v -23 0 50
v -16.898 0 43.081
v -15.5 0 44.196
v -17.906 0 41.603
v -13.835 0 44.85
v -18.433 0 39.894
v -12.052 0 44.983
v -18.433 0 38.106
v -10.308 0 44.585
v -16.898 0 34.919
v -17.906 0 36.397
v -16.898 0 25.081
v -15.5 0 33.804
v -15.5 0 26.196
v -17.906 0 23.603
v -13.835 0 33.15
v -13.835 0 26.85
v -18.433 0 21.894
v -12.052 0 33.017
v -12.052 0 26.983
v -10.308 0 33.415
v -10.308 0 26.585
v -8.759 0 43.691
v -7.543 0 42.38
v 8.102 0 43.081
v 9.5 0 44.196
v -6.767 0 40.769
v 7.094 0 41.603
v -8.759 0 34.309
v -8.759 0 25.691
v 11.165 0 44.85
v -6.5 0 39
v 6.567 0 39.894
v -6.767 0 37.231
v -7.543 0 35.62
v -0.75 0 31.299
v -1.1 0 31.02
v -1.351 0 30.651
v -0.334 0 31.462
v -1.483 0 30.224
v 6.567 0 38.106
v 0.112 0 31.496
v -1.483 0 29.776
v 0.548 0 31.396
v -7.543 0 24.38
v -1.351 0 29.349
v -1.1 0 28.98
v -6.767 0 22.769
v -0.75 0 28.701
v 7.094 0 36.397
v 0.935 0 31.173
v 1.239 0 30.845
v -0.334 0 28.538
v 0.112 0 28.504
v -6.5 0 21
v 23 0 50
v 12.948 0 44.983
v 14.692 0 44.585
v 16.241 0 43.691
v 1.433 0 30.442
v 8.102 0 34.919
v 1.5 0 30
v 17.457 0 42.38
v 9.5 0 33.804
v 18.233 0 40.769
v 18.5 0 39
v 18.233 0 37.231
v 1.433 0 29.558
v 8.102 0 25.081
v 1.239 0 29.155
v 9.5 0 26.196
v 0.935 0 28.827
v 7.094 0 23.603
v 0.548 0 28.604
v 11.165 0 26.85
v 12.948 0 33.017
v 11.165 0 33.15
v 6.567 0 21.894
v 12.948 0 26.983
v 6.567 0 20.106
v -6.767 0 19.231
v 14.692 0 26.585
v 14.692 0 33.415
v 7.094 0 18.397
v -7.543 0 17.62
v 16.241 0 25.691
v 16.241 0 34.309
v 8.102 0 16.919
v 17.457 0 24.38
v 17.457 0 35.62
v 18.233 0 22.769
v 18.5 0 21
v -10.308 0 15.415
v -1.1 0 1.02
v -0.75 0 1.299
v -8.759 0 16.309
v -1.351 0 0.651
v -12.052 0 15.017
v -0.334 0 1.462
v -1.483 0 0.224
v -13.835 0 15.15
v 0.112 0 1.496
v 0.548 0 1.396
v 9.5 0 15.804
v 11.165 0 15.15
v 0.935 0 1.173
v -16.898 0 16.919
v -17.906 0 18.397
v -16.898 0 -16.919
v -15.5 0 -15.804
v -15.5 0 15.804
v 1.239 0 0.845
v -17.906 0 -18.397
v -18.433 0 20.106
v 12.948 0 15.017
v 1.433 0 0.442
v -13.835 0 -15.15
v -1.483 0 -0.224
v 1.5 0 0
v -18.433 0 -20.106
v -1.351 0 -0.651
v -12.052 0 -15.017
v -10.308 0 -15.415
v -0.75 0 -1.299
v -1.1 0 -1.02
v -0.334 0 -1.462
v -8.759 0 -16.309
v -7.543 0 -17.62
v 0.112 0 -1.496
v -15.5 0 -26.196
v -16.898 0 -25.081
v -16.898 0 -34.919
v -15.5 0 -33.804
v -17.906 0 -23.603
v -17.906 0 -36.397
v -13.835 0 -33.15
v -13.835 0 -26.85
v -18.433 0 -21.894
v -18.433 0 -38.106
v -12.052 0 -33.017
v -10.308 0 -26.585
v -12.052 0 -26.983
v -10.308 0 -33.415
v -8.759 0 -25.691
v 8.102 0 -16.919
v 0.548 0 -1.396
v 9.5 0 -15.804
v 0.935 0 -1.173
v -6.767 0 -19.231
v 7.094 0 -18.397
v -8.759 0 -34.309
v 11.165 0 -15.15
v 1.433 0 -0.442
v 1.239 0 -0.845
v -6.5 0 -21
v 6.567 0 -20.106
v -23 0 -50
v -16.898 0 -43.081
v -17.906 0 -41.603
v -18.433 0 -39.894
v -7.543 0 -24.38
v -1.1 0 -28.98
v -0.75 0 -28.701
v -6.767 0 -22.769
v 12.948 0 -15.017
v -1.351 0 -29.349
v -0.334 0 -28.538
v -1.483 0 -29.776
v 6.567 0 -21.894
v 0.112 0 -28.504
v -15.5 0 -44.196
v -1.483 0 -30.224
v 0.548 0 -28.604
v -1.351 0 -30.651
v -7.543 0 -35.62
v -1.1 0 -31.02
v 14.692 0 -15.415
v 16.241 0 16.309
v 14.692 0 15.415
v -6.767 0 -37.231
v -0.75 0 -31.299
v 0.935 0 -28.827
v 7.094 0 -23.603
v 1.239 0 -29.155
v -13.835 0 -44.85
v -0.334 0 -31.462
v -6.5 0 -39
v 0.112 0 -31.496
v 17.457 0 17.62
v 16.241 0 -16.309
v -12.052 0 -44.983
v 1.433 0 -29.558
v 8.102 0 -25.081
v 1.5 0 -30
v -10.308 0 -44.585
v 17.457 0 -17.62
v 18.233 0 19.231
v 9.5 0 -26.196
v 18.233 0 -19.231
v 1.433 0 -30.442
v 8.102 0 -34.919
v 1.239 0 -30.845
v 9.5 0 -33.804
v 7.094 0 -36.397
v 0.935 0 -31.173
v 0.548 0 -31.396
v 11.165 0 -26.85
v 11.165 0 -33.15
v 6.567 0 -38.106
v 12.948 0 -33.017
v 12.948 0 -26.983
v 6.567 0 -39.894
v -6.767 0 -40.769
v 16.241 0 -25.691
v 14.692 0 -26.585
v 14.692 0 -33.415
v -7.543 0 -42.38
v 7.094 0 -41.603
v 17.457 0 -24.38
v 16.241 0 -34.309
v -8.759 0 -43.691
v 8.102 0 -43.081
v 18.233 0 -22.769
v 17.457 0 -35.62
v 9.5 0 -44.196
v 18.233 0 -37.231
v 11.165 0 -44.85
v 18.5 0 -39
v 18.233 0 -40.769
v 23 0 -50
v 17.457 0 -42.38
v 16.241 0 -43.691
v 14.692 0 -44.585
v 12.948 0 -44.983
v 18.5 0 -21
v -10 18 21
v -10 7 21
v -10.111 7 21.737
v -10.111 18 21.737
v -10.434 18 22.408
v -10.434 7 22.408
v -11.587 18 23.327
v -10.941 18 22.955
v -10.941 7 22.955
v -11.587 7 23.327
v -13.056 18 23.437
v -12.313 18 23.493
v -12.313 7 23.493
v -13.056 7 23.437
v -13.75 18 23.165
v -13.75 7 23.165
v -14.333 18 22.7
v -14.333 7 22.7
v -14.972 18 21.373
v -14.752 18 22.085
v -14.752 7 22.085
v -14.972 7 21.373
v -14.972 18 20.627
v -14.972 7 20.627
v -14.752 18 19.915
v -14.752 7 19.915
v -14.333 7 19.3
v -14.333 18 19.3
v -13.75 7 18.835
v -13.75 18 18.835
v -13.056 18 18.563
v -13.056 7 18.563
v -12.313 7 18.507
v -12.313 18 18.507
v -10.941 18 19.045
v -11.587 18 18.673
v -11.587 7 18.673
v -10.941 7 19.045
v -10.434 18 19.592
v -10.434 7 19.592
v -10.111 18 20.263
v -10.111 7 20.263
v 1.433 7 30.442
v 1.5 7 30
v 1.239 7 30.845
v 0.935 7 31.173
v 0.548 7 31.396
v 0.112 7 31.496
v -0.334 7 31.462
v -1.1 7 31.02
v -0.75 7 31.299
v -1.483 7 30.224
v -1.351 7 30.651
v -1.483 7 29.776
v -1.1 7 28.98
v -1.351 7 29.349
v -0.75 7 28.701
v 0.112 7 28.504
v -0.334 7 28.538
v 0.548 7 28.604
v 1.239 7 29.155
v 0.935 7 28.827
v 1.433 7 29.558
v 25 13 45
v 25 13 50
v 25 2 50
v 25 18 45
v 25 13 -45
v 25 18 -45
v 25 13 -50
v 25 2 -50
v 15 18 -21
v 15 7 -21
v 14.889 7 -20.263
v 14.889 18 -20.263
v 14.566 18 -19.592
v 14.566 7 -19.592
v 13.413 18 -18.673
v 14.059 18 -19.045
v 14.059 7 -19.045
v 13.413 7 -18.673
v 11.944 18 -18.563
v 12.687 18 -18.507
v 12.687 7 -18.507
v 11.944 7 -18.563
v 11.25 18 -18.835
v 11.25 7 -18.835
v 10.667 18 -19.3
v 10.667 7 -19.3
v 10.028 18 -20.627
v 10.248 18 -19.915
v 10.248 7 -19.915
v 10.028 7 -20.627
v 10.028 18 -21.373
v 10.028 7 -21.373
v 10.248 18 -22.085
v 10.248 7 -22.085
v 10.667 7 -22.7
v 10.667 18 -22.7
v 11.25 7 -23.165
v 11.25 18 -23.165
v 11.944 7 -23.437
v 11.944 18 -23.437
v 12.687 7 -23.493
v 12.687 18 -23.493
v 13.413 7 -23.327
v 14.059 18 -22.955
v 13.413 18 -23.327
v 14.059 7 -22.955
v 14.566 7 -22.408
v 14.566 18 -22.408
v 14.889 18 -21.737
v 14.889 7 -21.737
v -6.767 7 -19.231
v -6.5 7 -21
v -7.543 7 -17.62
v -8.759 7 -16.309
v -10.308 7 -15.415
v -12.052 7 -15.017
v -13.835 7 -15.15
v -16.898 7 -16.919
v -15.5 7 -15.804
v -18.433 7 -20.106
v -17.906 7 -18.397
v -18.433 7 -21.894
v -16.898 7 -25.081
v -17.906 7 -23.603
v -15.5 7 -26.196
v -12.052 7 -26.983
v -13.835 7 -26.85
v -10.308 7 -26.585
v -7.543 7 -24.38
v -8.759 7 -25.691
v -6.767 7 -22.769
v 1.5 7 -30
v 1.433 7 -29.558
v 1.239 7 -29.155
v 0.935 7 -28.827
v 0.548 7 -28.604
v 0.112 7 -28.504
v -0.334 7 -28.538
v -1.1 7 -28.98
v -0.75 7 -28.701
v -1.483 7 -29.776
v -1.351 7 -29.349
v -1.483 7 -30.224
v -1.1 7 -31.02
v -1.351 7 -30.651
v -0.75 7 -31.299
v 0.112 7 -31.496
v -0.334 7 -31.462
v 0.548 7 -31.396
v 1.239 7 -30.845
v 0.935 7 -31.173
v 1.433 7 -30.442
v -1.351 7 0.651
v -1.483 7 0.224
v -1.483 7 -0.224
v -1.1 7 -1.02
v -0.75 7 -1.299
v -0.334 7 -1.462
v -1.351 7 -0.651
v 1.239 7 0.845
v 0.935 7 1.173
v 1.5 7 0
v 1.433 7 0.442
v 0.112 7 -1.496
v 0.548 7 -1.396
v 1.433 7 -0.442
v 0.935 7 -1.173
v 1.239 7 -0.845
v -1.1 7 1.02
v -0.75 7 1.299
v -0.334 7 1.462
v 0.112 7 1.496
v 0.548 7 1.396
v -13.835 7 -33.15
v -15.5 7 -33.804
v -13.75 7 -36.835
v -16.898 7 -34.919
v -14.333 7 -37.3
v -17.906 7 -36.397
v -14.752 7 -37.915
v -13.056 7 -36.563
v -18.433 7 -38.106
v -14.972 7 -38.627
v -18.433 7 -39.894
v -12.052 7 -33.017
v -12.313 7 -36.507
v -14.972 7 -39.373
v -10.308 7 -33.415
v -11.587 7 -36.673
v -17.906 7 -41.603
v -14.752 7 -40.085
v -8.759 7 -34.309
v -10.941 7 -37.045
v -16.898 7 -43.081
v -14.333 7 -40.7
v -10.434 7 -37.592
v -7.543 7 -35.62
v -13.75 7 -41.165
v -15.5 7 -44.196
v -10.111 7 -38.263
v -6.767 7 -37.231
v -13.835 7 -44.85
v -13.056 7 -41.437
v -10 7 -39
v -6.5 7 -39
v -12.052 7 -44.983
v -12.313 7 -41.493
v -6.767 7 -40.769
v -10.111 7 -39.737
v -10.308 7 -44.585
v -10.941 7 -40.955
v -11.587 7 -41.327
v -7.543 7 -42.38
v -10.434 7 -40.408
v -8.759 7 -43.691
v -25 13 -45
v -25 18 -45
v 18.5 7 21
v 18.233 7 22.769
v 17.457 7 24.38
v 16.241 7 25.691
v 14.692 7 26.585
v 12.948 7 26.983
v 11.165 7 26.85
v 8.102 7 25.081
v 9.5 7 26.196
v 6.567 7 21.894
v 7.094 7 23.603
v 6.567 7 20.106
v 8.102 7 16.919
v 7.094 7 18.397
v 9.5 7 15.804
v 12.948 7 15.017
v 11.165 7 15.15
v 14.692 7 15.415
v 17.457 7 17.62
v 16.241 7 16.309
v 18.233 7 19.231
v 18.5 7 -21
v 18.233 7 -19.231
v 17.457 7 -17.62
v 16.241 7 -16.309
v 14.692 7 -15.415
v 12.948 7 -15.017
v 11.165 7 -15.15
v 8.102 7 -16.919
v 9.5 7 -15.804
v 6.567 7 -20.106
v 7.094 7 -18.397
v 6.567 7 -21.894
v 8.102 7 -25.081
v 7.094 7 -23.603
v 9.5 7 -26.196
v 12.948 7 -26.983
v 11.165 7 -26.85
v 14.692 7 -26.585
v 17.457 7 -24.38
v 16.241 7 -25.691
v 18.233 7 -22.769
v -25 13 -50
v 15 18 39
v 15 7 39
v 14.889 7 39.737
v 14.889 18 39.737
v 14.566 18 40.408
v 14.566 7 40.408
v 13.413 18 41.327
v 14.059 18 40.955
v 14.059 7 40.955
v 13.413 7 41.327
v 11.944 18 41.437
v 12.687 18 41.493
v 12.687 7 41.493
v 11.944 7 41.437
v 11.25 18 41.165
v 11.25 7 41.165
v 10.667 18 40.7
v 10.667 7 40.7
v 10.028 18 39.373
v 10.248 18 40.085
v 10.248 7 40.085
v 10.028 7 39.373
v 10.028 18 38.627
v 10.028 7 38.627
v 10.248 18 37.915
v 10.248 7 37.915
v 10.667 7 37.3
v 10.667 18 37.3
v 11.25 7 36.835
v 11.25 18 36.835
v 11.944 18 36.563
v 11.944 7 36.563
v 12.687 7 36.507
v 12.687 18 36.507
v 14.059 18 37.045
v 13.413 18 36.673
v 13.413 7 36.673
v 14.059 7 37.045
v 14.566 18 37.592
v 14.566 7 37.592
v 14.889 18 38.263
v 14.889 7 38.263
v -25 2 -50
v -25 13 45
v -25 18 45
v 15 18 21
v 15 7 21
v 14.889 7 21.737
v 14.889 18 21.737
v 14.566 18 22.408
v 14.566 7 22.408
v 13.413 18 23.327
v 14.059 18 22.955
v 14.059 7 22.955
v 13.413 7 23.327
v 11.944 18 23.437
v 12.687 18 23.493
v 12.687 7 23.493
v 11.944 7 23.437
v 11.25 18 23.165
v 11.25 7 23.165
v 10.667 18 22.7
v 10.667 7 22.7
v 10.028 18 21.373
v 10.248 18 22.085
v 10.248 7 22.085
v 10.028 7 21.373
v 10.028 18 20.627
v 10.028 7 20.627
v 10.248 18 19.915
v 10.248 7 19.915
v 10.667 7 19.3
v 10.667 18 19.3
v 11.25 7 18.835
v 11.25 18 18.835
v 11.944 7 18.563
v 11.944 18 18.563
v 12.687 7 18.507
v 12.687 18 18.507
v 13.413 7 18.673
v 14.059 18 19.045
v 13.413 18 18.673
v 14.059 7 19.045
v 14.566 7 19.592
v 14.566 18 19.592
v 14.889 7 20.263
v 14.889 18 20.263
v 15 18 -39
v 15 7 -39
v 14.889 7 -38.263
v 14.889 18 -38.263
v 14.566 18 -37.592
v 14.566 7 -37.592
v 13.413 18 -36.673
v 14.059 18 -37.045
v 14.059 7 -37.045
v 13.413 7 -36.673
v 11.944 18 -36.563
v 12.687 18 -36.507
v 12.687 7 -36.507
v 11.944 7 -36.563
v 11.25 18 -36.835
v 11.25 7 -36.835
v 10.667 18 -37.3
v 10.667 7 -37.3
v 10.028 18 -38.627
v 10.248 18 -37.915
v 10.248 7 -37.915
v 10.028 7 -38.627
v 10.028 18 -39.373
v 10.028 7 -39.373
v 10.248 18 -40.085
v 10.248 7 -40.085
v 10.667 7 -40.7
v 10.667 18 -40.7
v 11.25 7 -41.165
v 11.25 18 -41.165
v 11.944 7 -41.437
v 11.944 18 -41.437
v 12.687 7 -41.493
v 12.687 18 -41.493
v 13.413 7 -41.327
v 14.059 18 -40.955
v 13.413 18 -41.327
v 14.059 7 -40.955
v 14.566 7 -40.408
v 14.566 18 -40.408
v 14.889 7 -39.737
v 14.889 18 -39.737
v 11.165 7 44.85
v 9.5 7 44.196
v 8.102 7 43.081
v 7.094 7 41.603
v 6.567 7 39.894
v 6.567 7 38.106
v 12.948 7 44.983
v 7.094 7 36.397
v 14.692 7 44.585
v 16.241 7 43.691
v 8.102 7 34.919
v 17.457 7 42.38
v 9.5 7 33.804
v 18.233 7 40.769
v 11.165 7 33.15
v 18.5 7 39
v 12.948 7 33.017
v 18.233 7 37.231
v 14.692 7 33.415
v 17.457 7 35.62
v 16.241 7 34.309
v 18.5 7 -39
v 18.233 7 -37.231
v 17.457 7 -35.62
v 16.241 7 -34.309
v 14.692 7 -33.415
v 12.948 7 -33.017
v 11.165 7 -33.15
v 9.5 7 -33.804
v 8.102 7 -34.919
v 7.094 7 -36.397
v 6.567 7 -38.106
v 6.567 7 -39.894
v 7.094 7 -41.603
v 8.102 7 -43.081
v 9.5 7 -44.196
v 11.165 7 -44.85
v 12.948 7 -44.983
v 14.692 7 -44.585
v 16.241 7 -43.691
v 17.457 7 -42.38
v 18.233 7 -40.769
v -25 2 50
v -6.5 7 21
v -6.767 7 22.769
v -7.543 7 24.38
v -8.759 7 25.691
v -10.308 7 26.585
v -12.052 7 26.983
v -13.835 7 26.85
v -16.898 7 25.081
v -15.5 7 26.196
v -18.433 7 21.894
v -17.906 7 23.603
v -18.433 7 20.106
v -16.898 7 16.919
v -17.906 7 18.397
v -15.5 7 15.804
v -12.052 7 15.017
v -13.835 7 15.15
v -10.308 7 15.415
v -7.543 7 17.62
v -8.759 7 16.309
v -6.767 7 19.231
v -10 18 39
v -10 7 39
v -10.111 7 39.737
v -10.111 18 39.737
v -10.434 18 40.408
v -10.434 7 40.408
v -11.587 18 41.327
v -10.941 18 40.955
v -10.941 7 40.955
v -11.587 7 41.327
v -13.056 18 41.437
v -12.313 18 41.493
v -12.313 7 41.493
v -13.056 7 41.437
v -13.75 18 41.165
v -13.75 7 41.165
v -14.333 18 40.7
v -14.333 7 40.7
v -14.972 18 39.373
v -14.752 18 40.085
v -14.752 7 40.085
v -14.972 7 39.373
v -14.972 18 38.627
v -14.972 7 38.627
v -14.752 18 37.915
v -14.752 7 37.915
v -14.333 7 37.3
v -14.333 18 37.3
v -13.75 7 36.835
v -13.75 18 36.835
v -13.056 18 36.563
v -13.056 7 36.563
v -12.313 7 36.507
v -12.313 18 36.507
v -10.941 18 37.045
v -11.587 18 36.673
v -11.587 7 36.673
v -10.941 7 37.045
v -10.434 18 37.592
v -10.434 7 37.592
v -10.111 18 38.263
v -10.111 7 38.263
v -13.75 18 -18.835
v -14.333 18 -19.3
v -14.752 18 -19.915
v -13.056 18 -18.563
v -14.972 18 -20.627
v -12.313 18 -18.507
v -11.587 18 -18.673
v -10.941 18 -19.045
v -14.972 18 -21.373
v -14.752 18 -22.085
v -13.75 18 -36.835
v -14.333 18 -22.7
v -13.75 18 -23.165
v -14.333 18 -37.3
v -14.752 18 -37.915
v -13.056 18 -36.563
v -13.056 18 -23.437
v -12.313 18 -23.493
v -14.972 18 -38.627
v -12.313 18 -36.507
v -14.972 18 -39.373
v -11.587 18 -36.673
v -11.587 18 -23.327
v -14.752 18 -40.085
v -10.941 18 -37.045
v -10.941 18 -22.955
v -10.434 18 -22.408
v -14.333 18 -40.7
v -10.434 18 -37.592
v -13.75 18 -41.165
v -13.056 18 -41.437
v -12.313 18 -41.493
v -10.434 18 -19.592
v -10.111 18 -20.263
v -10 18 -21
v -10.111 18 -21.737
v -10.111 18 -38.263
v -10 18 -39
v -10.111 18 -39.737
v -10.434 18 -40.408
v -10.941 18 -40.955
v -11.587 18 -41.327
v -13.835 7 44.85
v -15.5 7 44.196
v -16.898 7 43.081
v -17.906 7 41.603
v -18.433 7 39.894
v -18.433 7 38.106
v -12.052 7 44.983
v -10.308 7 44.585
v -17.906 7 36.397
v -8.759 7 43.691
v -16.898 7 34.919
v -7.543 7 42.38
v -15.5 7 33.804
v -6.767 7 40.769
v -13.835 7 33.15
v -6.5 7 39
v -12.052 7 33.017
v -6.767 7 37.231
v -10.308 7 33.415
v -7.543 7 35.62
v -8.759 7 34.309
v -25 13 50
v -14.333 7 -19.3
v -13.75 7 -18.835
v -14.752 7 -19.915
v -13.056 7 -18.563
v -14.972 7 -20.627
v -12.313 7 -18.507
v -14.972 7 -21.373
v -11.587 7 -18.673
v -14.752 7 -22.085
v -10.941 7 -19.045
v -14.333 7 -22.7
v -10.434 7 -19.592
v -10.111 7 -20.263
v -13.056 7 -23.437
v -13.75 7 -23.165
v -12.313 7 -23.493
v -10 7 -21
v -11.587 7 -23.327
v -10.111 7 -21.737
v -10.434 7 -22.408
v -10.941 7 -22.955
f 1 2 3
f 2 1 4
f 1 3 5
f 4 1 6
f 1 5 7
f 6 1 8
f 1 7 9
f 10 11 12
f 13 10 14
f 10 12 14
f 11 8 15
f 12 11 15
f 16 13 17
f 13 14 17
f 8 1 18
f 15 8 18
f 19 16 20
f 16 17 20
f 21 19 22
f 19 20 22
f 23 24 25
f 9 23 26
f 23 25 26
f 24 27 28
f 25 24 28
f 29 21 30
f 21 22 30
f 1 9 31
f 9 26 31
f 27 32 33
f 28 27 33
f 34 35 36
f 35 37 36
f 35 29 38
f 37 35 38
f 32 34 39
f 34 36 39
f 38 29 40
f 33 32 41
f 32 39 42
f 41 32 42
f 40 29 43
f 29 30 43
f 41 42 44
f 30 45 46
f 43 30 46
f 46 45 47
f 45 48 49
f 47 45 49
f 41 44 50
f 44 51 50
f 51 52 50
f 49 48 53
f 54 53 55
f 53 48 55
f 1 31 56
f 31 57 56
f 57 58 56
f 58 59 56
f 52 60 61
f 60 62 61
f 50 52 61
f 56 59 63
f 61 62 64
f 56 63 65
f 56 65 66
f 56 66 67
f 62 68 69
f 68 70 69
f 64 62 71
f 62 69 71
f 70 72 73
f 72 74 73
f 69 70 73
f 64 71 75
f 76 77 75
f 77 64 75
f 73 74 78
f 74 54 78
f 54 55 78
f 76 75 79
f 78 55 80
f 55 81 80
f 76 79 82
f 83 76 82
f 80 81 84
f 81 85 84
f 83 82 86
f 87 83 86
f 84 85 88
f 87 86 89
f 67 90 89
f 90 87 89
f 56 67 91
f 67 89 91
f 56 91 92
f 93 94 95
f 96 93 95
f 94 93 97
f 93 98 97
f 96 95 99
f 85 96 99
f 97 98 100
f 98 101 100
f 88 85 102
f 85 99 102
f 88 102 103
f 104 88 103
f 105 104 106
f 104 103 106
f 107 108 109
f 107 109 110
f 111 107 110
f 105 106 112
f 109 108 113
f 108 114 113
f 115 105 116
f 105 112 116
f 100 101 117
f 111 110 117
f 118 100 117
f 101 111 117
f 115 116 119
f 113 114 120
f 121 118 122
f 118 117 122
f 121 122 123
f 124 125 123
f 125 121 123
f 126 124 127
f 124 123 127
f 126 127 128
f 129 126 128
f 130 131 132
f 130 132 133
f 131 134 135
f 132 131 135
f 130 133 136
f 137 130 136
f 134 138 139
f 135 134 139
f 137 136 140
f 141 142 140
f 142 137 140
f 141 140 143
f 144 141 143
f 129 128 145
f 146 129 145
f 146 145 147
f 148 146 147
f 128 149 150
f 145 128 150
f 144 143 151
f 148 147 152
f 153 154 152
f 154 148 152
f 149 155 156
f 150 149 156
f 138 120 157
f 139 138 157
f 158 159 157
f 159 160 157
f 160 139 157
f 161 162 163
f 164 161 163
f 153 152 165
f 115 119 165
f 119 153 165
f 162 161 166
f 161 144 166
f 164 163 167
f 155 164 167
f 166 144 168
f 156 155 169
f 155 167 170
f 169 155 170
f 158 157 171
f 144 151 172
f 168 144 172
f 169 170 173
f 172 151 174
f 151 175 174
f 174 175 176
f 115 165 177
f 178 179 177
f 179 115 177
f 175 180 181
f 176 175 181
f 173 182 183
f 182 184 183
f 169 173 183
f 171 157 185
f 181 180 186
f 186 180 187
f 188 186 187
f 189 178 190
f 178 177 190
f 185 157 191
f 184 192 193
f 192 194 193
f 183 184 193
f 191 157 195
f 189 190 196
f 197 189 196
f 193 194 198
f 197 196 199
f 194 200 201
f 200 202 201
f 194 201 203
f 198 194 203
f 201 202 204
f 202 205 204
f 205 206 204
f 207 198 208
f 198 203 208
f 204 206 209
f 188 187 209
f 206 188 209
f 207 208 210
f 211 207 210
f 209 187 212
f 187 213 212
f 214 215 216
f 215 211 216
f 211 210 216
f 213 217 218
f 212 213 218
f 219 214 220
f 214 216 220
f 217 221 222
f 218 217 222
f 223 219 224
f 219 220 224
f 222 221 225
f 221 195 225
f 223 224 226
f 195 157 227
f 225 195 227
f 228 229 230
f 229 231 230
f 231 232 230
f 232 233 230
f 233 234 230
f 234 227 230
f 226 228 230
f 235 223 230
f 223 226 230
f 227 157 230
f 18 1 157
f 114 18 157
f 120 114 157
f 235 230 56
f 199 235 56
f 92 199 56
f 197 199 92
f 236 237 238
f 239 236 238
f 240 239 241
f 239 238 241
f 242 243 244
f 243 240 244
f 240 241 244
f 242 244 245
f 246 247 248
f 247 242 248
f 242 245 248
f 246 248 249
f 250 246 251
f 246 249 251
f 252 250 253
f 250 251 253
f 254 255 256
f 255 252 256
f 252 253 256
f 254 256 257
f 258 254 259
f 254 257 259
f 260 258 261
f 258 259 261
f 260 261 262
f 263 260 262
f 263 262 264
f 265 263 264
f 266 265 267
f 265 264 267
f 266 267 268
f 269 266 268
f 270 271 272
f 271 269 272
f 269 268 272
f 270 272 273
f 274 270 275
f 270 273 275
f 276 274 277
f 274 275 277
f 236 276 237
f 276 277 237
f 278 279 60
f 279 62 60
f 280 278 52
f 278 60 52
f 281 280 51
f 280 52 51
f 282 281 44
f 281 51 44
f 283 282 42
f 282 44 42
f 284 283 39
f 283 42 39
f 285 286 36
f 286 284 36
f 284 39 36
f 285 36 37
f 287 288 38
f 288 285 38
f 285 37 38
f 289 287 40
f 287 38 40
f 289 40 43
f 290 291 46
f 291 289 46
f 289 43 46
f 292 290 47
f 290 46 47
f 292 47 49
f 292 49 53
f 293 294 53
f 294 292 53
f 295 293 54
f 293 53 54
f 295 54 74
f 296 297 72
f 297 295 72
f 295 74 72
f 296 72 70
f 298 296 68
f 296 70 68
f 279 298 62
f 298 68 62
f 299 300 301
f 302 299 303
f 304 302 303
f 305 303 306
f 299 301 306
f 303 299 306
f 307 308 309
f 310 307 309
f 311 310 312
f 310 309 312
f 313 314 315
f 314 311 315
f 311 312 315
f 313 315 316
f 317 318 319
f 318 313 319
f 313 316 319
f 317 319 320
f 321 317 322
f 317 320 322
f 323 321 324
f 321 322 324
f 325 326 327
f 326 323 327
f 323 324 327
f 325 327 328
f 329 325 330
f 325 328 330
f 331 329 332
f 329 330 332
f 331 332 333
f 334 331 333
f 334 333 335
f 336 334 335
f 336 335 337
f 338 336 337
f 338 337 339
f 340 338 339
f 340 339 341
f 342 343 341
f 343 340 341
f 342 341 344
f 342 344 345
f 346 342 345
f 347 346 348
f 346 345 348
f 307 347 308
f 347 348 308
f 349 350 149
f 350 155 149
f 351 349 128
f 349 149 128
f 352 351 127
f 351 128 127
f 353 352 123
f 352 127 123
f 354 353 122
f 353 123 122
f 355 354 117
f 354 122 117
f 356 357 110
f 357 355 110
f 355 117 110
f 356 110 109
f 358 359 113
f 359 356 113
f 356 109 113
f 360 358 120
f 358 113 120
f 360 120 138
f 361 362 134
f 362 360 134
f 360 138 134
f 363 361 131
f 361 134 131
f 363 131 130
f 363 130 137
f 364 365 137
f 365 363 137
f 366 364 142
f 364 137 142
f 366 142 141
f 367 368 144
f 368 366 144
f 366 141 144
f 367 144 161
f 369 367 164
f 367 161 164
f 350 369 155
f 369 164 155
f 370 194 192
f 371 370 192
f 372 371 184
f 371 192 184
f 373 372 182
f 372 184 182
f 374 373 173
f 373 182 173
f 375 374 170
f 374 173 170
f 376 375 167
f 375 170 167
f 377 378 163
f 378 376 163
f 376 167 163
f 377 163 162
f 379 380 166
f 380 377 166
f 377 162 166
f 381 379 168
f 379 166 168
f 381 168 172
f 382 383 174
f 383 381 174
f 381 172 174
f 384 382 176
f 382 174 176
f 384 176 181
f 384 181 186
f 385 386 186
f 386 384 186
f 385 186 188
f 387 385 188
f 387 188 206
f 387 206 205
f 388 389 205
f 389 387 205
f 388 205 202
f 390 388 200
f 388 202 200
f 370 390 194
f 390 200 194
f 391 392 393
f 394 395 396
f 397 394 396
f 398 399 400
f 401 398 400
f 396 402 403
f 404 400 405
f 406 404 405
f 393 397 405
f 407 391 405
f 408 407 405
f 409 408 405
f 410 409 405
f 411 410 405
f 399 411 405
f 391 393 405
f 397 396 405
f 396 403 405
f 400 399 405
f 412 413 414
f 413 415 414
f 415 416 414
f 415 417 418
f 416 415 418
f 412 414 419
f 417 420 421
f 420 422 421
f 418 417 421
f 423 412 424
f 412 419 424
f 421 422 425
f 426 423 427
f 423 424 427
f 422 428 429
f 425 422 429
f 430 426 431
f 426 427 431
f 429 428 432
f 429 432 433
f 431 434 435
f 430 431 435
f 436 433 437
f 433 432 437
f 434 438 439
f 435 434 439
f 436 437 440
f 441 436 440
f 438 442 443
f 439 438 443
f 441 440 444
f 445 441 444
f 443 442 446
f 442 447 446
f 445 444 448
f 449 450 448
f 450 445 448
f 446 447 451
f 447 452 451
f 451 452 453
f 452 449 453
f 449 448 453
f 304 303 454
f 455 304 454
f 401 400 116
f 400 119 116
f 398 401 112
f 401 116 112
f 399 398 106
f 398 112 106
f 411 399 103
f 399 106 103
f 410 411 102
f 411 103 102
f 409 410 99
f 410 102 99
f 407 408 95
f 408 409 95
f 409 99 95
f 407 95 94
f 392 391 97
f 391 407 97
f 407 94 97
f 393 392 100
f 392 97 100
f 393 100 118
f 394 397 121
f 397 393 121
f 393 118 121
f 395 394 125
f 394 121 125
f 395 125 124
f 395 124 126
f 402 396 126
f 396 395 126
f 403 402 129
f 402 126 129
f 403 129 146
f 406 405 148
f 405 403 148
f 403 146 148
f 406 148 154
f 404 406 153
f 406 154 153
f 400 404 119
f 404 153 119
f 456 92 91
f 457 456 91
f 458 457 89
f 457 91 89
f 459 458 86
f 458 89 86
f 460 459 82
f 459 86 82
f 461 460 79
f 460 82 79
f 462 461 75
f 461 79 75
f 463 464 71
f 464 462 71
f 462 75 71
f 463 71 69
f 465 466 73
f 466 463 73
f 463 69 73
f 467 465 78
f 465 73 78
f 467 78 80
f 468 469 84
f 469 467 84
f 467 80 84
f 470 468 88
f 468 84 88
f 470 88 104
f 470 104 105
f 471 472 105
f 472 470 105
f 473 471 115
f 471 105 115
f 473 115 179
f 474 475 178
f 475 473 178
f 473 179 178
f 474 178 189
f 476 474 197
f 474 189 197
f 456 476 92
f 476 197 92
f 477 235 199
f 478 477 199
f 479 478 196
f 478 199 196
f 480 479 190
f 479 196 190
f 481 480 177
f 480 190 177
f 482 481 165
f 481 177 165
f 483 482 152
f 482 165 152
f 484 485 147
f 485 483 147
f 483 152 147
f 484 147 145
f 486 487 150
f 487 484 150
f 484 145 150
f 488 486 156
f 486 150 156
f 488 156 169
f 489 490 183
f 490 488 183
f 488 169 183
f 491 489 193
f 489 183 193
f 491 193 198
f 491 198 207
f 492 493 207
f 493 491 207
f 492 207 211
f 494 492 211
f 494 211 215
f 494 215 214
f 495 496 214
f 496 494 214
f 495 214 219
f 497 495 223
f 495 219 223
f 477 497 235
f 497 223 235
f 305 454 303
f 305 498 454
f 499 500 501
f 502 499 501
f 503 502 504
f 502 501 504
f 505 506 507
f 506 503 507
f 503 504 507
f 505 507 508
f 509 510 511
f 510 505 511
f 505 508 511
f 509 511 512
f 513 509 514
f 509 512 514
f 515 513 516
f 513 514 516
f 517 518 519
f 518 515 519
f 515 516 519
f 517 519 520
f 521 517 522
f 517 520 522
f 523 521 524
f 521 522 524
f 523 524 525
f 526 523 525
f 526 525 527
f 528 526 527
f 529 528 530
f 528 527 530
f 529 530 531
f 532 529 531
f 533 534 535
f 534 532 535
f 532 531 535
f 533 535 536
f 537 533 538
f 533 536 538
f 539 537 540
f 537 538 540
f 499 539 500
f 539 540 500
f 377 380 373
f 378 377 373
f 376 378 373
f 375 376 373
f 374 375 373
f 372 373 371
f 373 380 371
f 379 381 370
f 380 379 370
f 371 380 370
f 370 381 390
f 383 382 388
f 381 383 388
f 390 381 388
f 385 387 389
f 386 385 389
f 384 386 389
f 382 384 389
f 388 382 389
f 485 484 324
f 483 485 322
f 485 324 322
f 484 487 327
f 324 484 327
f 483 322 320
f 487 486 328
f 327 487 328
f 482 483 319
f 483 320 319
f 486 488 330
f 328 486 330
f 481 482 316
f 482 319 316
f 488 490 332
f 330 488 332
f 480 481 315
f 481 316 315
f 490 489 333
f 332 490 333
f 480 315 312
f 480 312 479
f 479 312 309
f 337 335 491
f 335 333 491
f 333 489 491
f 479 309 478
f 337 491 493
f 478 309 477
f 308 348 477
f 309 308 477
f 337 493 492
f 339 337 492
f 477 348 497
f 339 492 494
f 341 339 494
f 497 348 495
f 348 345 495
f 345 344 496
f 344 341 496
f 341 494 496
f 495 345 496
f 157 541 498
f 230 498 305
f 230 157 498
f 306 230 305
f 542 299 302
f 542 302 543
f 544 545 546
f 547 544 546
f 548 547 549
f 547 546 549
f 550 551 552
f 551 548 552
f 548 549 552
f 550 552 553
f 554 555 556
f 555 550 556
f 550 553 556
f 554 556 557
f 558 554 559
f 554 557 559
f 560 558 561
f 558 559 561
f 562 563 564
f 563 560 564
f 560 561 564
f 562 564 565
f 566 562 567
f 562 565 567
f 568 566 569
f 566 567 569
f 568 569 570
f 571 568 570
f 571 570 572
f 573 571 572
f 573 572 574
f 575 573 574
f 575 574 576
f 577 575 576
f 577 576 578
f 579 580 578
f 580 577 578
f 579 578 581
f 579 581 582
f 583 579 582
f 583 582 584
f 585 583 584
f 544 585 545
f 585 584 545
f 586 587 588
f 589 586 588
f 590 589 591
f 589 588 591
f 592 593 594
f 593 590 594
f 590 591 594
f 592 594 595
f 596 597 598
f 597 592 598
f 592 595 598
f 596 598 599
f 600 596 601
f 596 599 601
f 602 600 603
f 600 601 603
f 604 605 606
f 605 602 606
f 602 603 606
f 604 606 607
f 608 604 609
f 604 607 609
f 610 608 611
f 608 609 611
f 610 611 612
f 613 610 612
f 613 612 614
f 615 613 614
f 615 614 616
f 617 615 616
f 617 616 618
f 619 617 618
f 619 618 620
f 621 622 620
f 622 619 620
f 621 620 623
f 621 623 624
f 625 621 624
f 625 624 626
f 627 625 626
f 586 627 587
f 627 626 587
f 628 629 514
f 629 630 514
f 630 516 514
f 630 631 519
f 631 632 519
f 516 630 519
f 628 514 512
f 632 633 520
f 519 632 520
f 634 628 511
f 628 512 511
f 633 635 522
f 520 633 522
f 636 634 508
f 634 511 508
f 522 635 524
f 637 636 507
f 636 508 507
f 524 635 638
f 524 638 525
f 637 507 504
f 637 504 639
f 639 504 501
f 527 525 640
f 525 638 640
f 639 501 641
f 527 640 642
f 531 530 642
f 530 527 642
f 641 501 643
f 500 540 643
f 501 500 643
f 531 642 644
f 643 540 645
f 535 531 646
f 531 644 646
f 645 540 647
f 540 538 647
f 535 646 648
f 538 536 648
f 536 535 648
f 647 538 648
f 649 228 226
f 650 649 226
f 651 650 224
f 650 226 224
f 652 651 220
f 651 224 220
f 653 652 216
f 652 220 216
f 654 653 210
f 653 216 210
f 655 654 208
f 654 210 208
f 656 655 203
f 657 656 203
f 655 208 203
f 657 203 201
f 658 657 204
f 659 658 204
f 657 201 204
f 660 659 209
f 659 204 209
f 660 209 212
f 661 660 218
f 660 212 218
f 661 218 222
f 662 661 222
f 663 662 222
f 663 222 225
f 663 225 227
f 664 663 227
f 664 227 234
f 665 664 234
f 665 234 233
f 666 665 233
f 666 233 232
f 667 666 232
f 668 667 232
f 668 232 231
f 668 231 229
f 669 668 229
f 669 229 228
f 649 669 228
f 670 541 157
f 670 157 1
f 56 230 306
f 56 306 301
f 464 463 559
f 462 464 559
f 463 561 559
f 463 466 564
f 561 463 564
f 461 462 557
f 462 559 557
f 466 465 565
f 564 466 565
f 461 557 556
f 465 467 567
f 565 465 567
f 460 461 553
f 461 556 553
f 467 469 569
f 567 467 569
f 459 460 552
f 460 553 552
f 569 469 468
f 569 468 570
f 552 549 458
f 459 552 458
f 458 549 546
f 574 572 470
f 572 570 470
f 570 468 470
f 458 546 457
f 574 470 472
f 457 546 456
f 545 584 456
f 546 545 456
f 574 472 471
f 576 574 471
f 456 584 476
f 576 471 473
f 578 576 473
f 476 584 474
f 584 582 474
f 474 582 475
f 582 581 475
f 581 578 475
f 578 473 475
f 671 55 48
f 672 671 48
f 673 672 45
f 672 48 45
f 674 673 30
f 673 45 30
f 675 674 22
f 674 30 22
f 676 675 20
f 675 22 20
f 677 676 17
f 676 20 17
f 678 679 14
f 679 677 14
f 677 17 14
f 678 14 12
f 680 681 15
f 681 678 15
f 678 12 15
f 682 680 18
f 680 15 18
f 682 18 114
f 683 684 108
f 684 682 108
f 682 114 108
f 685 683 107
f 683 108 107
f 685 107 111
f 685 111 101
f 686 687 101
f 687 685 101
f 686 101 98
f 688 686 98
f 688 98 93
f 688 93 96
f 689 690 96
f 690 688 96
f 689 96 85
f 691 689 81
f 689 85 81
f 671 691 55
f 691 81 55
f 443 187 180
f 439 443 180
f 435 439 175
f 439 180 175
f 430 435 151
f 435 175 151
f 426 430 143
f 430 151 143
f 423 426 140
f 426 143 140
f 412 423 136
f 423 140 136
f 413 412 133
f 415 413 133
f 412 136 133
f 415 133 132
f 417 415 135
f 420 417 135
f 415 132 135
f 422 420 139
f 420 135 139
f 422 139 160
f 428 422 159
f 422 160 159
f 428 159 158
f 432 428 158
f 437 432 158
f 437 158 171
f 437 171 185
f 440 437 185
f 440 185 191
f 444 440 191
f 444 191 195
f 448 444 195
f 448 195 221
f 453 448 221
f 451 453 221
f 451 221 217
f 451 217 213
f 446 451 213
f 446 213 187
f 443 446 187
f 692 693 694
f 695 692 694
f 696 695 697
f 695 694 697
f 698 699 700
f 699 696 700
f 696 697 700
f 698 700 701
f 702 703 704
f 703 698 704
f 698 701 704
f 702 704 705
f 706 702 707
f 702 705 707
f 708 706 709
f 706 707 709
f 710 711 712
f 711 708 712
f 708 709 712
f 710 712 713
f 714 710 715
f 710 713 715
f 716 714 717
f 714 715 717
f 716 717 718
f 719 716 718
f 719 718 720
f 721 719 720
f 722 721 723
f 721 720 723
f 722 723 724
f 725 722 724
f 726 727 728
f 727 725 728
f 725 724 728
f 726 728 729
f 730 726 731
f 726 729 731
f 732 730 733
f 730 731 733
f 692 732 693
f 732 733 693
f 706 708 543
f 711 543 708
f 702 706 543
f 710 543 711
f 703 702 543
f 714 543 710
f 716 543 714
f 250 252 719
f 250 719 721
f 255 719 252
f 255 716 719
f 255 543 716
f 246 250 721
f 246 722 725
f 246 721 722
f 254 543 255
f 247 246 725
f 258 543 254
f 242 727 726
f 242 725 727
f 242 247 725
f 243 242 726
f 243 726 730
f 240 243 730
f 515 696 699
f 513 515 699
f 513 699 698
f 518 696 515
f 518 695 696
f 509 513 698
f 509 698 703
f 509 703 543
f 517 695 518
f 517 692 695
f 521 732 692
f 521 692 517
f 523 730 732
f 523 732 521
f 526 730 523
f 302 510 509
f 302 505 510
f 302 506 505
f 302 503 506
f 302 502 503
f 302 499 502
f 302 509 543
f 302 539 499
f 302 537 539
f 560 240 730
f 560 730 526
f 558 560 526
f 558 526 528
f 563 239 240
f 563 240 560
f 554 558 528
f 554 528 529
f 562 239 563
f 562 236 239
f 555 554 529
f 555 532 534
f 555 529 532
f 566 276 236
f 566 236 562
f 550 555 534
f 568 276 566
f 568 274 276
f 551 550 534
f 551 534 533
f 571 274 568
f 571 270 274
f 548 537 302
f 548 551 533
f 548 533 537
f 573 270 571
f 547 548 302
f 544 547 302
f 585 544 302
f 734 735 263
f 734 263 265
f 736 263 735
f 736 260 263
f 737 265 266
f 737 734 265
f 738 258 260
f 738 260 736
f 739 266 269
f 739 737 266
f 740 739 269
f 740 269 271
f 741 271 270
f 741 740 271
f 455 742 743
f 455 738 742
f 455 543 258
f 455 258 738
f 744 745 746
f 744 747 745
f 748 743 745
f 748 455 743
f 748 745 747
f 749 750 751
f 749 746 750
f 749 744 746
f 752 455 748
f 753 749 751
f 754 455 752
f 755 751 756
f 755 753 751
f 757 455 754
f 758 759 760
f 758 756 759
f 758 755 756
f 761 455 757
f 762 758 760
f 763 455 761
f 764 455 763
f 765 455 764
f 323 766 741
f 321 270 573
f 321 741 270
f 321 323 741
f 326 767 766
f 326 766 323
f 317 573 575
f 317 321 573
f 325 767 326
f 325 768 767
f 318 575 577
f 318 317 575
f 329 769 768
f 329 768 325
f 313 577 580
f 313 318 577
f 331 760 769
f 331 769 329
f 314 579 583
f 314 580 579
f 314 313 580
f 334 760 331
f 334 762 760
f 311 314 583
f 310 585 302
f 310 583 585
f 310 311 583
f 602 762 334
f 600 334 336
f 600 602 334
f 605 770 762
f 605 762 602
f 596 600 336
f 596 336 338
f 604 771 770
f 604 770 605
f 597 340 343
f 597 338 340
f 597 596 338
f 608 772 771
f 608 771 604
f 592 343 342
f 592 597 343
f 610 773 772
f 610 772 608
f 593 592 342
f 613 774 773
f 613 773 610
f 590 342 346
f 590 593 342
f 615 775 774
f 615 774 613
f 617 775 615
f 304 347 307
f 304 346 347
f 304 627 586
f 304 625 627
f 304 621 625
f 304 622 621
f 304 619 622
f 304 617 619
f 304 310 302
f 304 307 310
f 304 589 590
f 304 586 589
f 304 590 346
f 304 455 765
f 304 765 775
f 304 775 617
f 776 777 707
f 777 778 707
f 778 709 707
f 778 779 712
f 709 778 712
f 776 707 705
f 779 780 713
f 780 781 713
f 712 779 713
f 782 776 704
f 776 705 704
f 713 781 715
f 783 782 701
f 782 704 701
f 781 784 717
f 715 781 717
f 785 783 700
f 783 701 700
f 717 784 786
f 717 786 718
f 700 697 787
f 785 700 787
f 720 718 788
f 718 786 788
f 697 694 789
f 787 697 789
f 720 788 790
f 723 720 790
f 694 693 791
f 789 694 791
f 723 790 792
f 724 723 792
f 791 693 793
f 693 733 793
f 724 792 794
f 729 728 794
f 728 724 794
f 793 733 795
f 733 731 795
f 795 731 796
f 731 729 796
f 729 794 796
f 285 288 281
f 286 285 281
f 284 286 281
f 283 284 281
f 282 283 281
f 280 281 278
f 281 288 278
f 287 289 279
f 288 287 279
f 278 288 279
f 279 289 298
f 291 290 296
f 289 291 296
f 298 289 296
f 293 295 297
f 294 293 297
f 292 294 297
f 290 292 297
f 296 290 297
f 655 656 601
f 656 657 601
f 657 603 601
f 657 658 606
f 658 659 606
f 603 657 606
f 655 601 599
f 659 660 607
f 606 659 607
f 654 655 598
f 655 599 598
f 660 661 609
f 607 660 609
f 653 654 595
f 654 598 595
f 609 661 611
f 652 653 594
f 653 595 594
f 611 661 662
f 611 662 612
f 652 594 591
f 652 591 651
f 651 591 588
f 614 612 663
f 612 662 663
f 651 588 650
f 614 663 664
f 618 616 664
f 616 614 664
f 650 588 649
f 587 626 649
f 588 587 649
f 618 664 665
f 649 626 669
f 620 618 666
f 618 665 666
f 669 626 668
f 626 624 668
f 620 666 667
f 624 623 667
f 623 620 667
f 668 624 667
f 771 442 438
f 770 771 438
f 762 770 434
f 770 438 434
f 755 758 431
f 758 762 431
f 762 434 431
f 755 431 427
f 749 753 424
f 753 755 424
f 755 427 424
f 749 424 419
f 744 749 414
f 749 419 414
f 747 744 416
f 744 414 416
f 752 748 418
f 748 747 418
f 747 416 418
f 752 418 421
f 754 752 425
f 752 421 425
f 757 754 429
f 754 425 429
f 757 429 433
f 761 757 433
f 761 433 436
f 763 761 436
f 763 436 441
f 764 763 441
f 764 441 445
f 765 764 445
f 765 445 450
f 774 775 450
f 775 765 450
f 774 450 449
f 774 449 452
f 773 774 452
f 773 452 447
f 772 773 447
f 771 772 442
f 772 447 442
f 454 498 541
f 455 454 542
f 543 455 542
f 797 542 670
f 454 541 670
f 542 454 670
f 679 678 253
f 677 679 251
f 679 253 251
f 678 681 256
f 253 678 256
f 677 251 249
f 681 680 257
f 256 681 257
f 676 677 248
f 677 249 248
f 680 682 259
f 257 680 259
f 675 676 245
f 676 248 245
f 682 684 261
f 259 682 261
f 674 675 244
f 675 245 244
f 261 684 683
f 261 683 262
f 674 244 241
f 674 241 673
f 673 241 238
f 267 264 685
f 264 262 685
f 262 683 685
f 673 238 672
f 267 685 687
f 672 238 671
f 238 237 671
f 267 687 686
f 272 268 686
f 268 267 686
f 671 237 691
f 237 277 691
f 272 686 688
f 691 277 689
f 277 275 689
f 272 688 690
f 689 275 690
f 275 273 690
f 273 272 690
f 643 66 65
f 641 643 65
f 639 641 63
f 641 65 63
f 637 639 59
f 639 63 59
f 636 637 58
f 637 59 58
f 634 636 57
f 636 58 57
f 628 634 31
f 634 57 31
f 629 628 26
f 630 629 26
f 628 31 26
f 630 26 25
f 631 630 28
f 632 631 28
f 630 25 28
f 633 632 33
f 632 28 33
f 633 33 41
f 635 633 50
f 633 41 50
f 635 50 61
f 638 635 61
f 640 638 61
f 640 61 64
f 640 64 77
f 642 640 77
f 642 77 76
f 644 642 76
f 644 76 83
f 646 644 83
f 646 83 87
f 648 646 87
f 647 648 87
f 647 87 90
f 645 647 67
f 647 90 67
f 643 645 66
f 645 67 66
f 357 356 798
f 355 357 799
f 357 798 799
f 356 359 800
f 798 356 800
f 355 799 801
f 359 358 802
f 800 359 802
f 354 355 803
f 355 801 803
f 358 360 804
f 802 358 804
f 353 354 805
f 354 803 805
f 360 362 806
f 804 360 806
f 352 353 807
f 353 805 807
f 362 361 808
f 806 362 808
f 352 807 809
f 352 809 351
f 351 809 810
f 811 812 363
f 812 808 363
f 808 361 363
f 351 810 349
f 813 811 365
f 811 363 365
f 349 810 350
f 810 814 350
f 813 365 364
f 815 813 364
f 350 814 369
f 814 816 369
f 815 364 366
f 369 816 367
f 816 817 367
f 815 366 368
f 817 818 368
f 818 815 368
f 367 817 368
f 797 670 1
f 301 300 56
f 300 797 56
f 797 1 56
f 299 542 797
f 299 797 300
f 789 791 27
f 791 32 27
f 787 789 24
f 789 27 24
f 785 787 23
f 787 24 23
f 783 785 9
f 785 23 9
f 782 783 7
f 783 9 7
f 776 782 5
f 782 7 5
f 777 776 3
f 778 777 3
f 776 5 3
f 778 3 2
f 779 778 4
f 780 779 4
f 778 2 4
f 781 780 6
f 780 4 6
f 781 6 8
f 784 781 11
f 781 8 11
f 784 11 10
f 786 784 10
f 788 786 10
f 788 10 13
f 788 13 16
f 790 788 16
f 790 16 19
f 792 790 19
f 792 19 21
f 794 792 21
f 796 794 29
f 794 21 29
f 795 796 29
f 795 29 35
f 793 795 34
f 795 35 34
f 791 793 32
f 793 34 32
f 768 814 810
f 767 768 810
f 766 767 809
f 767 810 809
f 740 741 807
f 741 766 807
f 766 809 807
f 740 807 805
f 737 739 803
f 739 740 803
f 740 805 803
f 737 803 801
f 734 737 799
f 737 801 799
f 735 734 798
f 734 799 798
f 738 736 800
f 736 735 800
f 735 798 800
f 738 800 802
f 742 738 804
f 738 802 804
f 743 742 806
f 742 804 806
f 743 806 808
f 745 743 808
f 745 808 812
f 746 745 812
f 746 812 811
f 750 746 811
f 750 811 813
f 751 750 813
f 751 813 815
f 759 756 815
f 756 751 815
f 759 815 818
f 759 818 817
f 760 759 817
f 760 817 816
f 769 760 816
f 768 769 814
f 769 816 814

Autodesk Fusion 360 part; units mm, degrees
sketch "Board" plane through (0, 0, 0) normal (0, 1, 0) x (1, 0, 0)
  line L0 (-25, -45) -> (-25, -50)
  circle A0 centre (12.5, -39) radius 6
  line L1 (-25, -50) -> (25, -50)
  circle A1 centre (12.5, -21) radius 2.5
  circle A2 centre (12.5, 21) radius 2.5
  line L2 (-25, 50) -> (25, 50)
  circle A3 centre (0, 30) radius 1.5
  line L3 (-25, 45) -> (-25, 50)
  circle A4 centre (12.5, 39) radius 6
  circle A5 centre (-12.5, 21) radius 2.5
  circle A6 centre (12.5, 21) radius 6
  line L4 (25, 50) -> (25, 45)
  circle A7 centre (12.5, -21) radius 6
  line L5 (-25, 50) -> (25, 50)
  circle A8 centre (-12.5, 21) radius 6
  circle A9 centre (-12.5, -21) radius 2.5
  line L6 (25, 50) -> (-25, 50)
  circle A10 centre (12.5, 39) radius 2.5
  circle A11 centre (-12.5, 39) radius 6
  circle A12 centre (-12.5, 39) radius 2.5
  line L7 (25, -45) -> (-25, -45)
  line L8 (25, -50) -> (-25, -50)
  circle A13 centre (12.5, -39) radius 2.5
  circle A14 centre (-12.5, -39) radius 6
  circle A15 centre (0, -30) radius 1.5
  circle A16 centre (-12.5, -39) radius 2.5
  line L9 (25, -50) -> (25, -45)
  line L10 (25, 50) -> (25, -50)
  line L11 (25, 45) -> (-25, 45)
  line L12 (-25, -50) -> (-25, 50)
  circle A17 centre (0, 0) radius 1.5
  circle A18 centre (-12.5, -21) radius 6
  dimension "d23" = 100
  dimension "d24" = 5
  dimension "d25" = 5
  dimension "d26" = 5
  dimension "d27" = 5
  dimension "d28" = 5
  dimension "d29" = 5
  dimension "d30" = 5
  dimension "d31" = 5
  dimension "d32" = 3
  dimension "d33" = 3
  dimension "d34" = 3
  dimension "d35" = 12
  dimension "d36" = 12
  dimension "d37" = 12
  dimension "d38" = 12
  dimension "d39" = 12
  dimension "d40" = 12
  dimension "d41" = 12
  dimension "d42" = 12
  dimension "d43" = 5
  dimension "d44" = 5
extrude "Extrude1" add sketch "Board" along normal blind 13 contours L0 L1 L7 L8 L9 L10 L12 | L2 L3 L4 L5 L6 L10 L11 L12 makes body 1 at (8.3333, 4.3333, 45) makes body 2 at (-8.3333, 4.3333, -50)
extrude "Extrude2" add sketch "Board" along normal blind 18 contours A14 | A0 | A4 | A11 | L7 L10 L11 L12 | A3 | A6 | A7 | A8 | A15 | A17 | A18 bodies 1 2
extrude "Extrude3" cut sketch "Board" along normal blind 7 contours A14 | A0 | A4 | A11 | A6 | A7 | A8 | A18 bodies 1
extrude "Extrude4" cut sketch "Board" along normal blind 7 contours A3 | A15 | A17 bodies 1
chamfer "Chamfer1" distance 2 angle 45 2 edges at (25, 0, 0) (-25, 0, 0) on bodies 1
